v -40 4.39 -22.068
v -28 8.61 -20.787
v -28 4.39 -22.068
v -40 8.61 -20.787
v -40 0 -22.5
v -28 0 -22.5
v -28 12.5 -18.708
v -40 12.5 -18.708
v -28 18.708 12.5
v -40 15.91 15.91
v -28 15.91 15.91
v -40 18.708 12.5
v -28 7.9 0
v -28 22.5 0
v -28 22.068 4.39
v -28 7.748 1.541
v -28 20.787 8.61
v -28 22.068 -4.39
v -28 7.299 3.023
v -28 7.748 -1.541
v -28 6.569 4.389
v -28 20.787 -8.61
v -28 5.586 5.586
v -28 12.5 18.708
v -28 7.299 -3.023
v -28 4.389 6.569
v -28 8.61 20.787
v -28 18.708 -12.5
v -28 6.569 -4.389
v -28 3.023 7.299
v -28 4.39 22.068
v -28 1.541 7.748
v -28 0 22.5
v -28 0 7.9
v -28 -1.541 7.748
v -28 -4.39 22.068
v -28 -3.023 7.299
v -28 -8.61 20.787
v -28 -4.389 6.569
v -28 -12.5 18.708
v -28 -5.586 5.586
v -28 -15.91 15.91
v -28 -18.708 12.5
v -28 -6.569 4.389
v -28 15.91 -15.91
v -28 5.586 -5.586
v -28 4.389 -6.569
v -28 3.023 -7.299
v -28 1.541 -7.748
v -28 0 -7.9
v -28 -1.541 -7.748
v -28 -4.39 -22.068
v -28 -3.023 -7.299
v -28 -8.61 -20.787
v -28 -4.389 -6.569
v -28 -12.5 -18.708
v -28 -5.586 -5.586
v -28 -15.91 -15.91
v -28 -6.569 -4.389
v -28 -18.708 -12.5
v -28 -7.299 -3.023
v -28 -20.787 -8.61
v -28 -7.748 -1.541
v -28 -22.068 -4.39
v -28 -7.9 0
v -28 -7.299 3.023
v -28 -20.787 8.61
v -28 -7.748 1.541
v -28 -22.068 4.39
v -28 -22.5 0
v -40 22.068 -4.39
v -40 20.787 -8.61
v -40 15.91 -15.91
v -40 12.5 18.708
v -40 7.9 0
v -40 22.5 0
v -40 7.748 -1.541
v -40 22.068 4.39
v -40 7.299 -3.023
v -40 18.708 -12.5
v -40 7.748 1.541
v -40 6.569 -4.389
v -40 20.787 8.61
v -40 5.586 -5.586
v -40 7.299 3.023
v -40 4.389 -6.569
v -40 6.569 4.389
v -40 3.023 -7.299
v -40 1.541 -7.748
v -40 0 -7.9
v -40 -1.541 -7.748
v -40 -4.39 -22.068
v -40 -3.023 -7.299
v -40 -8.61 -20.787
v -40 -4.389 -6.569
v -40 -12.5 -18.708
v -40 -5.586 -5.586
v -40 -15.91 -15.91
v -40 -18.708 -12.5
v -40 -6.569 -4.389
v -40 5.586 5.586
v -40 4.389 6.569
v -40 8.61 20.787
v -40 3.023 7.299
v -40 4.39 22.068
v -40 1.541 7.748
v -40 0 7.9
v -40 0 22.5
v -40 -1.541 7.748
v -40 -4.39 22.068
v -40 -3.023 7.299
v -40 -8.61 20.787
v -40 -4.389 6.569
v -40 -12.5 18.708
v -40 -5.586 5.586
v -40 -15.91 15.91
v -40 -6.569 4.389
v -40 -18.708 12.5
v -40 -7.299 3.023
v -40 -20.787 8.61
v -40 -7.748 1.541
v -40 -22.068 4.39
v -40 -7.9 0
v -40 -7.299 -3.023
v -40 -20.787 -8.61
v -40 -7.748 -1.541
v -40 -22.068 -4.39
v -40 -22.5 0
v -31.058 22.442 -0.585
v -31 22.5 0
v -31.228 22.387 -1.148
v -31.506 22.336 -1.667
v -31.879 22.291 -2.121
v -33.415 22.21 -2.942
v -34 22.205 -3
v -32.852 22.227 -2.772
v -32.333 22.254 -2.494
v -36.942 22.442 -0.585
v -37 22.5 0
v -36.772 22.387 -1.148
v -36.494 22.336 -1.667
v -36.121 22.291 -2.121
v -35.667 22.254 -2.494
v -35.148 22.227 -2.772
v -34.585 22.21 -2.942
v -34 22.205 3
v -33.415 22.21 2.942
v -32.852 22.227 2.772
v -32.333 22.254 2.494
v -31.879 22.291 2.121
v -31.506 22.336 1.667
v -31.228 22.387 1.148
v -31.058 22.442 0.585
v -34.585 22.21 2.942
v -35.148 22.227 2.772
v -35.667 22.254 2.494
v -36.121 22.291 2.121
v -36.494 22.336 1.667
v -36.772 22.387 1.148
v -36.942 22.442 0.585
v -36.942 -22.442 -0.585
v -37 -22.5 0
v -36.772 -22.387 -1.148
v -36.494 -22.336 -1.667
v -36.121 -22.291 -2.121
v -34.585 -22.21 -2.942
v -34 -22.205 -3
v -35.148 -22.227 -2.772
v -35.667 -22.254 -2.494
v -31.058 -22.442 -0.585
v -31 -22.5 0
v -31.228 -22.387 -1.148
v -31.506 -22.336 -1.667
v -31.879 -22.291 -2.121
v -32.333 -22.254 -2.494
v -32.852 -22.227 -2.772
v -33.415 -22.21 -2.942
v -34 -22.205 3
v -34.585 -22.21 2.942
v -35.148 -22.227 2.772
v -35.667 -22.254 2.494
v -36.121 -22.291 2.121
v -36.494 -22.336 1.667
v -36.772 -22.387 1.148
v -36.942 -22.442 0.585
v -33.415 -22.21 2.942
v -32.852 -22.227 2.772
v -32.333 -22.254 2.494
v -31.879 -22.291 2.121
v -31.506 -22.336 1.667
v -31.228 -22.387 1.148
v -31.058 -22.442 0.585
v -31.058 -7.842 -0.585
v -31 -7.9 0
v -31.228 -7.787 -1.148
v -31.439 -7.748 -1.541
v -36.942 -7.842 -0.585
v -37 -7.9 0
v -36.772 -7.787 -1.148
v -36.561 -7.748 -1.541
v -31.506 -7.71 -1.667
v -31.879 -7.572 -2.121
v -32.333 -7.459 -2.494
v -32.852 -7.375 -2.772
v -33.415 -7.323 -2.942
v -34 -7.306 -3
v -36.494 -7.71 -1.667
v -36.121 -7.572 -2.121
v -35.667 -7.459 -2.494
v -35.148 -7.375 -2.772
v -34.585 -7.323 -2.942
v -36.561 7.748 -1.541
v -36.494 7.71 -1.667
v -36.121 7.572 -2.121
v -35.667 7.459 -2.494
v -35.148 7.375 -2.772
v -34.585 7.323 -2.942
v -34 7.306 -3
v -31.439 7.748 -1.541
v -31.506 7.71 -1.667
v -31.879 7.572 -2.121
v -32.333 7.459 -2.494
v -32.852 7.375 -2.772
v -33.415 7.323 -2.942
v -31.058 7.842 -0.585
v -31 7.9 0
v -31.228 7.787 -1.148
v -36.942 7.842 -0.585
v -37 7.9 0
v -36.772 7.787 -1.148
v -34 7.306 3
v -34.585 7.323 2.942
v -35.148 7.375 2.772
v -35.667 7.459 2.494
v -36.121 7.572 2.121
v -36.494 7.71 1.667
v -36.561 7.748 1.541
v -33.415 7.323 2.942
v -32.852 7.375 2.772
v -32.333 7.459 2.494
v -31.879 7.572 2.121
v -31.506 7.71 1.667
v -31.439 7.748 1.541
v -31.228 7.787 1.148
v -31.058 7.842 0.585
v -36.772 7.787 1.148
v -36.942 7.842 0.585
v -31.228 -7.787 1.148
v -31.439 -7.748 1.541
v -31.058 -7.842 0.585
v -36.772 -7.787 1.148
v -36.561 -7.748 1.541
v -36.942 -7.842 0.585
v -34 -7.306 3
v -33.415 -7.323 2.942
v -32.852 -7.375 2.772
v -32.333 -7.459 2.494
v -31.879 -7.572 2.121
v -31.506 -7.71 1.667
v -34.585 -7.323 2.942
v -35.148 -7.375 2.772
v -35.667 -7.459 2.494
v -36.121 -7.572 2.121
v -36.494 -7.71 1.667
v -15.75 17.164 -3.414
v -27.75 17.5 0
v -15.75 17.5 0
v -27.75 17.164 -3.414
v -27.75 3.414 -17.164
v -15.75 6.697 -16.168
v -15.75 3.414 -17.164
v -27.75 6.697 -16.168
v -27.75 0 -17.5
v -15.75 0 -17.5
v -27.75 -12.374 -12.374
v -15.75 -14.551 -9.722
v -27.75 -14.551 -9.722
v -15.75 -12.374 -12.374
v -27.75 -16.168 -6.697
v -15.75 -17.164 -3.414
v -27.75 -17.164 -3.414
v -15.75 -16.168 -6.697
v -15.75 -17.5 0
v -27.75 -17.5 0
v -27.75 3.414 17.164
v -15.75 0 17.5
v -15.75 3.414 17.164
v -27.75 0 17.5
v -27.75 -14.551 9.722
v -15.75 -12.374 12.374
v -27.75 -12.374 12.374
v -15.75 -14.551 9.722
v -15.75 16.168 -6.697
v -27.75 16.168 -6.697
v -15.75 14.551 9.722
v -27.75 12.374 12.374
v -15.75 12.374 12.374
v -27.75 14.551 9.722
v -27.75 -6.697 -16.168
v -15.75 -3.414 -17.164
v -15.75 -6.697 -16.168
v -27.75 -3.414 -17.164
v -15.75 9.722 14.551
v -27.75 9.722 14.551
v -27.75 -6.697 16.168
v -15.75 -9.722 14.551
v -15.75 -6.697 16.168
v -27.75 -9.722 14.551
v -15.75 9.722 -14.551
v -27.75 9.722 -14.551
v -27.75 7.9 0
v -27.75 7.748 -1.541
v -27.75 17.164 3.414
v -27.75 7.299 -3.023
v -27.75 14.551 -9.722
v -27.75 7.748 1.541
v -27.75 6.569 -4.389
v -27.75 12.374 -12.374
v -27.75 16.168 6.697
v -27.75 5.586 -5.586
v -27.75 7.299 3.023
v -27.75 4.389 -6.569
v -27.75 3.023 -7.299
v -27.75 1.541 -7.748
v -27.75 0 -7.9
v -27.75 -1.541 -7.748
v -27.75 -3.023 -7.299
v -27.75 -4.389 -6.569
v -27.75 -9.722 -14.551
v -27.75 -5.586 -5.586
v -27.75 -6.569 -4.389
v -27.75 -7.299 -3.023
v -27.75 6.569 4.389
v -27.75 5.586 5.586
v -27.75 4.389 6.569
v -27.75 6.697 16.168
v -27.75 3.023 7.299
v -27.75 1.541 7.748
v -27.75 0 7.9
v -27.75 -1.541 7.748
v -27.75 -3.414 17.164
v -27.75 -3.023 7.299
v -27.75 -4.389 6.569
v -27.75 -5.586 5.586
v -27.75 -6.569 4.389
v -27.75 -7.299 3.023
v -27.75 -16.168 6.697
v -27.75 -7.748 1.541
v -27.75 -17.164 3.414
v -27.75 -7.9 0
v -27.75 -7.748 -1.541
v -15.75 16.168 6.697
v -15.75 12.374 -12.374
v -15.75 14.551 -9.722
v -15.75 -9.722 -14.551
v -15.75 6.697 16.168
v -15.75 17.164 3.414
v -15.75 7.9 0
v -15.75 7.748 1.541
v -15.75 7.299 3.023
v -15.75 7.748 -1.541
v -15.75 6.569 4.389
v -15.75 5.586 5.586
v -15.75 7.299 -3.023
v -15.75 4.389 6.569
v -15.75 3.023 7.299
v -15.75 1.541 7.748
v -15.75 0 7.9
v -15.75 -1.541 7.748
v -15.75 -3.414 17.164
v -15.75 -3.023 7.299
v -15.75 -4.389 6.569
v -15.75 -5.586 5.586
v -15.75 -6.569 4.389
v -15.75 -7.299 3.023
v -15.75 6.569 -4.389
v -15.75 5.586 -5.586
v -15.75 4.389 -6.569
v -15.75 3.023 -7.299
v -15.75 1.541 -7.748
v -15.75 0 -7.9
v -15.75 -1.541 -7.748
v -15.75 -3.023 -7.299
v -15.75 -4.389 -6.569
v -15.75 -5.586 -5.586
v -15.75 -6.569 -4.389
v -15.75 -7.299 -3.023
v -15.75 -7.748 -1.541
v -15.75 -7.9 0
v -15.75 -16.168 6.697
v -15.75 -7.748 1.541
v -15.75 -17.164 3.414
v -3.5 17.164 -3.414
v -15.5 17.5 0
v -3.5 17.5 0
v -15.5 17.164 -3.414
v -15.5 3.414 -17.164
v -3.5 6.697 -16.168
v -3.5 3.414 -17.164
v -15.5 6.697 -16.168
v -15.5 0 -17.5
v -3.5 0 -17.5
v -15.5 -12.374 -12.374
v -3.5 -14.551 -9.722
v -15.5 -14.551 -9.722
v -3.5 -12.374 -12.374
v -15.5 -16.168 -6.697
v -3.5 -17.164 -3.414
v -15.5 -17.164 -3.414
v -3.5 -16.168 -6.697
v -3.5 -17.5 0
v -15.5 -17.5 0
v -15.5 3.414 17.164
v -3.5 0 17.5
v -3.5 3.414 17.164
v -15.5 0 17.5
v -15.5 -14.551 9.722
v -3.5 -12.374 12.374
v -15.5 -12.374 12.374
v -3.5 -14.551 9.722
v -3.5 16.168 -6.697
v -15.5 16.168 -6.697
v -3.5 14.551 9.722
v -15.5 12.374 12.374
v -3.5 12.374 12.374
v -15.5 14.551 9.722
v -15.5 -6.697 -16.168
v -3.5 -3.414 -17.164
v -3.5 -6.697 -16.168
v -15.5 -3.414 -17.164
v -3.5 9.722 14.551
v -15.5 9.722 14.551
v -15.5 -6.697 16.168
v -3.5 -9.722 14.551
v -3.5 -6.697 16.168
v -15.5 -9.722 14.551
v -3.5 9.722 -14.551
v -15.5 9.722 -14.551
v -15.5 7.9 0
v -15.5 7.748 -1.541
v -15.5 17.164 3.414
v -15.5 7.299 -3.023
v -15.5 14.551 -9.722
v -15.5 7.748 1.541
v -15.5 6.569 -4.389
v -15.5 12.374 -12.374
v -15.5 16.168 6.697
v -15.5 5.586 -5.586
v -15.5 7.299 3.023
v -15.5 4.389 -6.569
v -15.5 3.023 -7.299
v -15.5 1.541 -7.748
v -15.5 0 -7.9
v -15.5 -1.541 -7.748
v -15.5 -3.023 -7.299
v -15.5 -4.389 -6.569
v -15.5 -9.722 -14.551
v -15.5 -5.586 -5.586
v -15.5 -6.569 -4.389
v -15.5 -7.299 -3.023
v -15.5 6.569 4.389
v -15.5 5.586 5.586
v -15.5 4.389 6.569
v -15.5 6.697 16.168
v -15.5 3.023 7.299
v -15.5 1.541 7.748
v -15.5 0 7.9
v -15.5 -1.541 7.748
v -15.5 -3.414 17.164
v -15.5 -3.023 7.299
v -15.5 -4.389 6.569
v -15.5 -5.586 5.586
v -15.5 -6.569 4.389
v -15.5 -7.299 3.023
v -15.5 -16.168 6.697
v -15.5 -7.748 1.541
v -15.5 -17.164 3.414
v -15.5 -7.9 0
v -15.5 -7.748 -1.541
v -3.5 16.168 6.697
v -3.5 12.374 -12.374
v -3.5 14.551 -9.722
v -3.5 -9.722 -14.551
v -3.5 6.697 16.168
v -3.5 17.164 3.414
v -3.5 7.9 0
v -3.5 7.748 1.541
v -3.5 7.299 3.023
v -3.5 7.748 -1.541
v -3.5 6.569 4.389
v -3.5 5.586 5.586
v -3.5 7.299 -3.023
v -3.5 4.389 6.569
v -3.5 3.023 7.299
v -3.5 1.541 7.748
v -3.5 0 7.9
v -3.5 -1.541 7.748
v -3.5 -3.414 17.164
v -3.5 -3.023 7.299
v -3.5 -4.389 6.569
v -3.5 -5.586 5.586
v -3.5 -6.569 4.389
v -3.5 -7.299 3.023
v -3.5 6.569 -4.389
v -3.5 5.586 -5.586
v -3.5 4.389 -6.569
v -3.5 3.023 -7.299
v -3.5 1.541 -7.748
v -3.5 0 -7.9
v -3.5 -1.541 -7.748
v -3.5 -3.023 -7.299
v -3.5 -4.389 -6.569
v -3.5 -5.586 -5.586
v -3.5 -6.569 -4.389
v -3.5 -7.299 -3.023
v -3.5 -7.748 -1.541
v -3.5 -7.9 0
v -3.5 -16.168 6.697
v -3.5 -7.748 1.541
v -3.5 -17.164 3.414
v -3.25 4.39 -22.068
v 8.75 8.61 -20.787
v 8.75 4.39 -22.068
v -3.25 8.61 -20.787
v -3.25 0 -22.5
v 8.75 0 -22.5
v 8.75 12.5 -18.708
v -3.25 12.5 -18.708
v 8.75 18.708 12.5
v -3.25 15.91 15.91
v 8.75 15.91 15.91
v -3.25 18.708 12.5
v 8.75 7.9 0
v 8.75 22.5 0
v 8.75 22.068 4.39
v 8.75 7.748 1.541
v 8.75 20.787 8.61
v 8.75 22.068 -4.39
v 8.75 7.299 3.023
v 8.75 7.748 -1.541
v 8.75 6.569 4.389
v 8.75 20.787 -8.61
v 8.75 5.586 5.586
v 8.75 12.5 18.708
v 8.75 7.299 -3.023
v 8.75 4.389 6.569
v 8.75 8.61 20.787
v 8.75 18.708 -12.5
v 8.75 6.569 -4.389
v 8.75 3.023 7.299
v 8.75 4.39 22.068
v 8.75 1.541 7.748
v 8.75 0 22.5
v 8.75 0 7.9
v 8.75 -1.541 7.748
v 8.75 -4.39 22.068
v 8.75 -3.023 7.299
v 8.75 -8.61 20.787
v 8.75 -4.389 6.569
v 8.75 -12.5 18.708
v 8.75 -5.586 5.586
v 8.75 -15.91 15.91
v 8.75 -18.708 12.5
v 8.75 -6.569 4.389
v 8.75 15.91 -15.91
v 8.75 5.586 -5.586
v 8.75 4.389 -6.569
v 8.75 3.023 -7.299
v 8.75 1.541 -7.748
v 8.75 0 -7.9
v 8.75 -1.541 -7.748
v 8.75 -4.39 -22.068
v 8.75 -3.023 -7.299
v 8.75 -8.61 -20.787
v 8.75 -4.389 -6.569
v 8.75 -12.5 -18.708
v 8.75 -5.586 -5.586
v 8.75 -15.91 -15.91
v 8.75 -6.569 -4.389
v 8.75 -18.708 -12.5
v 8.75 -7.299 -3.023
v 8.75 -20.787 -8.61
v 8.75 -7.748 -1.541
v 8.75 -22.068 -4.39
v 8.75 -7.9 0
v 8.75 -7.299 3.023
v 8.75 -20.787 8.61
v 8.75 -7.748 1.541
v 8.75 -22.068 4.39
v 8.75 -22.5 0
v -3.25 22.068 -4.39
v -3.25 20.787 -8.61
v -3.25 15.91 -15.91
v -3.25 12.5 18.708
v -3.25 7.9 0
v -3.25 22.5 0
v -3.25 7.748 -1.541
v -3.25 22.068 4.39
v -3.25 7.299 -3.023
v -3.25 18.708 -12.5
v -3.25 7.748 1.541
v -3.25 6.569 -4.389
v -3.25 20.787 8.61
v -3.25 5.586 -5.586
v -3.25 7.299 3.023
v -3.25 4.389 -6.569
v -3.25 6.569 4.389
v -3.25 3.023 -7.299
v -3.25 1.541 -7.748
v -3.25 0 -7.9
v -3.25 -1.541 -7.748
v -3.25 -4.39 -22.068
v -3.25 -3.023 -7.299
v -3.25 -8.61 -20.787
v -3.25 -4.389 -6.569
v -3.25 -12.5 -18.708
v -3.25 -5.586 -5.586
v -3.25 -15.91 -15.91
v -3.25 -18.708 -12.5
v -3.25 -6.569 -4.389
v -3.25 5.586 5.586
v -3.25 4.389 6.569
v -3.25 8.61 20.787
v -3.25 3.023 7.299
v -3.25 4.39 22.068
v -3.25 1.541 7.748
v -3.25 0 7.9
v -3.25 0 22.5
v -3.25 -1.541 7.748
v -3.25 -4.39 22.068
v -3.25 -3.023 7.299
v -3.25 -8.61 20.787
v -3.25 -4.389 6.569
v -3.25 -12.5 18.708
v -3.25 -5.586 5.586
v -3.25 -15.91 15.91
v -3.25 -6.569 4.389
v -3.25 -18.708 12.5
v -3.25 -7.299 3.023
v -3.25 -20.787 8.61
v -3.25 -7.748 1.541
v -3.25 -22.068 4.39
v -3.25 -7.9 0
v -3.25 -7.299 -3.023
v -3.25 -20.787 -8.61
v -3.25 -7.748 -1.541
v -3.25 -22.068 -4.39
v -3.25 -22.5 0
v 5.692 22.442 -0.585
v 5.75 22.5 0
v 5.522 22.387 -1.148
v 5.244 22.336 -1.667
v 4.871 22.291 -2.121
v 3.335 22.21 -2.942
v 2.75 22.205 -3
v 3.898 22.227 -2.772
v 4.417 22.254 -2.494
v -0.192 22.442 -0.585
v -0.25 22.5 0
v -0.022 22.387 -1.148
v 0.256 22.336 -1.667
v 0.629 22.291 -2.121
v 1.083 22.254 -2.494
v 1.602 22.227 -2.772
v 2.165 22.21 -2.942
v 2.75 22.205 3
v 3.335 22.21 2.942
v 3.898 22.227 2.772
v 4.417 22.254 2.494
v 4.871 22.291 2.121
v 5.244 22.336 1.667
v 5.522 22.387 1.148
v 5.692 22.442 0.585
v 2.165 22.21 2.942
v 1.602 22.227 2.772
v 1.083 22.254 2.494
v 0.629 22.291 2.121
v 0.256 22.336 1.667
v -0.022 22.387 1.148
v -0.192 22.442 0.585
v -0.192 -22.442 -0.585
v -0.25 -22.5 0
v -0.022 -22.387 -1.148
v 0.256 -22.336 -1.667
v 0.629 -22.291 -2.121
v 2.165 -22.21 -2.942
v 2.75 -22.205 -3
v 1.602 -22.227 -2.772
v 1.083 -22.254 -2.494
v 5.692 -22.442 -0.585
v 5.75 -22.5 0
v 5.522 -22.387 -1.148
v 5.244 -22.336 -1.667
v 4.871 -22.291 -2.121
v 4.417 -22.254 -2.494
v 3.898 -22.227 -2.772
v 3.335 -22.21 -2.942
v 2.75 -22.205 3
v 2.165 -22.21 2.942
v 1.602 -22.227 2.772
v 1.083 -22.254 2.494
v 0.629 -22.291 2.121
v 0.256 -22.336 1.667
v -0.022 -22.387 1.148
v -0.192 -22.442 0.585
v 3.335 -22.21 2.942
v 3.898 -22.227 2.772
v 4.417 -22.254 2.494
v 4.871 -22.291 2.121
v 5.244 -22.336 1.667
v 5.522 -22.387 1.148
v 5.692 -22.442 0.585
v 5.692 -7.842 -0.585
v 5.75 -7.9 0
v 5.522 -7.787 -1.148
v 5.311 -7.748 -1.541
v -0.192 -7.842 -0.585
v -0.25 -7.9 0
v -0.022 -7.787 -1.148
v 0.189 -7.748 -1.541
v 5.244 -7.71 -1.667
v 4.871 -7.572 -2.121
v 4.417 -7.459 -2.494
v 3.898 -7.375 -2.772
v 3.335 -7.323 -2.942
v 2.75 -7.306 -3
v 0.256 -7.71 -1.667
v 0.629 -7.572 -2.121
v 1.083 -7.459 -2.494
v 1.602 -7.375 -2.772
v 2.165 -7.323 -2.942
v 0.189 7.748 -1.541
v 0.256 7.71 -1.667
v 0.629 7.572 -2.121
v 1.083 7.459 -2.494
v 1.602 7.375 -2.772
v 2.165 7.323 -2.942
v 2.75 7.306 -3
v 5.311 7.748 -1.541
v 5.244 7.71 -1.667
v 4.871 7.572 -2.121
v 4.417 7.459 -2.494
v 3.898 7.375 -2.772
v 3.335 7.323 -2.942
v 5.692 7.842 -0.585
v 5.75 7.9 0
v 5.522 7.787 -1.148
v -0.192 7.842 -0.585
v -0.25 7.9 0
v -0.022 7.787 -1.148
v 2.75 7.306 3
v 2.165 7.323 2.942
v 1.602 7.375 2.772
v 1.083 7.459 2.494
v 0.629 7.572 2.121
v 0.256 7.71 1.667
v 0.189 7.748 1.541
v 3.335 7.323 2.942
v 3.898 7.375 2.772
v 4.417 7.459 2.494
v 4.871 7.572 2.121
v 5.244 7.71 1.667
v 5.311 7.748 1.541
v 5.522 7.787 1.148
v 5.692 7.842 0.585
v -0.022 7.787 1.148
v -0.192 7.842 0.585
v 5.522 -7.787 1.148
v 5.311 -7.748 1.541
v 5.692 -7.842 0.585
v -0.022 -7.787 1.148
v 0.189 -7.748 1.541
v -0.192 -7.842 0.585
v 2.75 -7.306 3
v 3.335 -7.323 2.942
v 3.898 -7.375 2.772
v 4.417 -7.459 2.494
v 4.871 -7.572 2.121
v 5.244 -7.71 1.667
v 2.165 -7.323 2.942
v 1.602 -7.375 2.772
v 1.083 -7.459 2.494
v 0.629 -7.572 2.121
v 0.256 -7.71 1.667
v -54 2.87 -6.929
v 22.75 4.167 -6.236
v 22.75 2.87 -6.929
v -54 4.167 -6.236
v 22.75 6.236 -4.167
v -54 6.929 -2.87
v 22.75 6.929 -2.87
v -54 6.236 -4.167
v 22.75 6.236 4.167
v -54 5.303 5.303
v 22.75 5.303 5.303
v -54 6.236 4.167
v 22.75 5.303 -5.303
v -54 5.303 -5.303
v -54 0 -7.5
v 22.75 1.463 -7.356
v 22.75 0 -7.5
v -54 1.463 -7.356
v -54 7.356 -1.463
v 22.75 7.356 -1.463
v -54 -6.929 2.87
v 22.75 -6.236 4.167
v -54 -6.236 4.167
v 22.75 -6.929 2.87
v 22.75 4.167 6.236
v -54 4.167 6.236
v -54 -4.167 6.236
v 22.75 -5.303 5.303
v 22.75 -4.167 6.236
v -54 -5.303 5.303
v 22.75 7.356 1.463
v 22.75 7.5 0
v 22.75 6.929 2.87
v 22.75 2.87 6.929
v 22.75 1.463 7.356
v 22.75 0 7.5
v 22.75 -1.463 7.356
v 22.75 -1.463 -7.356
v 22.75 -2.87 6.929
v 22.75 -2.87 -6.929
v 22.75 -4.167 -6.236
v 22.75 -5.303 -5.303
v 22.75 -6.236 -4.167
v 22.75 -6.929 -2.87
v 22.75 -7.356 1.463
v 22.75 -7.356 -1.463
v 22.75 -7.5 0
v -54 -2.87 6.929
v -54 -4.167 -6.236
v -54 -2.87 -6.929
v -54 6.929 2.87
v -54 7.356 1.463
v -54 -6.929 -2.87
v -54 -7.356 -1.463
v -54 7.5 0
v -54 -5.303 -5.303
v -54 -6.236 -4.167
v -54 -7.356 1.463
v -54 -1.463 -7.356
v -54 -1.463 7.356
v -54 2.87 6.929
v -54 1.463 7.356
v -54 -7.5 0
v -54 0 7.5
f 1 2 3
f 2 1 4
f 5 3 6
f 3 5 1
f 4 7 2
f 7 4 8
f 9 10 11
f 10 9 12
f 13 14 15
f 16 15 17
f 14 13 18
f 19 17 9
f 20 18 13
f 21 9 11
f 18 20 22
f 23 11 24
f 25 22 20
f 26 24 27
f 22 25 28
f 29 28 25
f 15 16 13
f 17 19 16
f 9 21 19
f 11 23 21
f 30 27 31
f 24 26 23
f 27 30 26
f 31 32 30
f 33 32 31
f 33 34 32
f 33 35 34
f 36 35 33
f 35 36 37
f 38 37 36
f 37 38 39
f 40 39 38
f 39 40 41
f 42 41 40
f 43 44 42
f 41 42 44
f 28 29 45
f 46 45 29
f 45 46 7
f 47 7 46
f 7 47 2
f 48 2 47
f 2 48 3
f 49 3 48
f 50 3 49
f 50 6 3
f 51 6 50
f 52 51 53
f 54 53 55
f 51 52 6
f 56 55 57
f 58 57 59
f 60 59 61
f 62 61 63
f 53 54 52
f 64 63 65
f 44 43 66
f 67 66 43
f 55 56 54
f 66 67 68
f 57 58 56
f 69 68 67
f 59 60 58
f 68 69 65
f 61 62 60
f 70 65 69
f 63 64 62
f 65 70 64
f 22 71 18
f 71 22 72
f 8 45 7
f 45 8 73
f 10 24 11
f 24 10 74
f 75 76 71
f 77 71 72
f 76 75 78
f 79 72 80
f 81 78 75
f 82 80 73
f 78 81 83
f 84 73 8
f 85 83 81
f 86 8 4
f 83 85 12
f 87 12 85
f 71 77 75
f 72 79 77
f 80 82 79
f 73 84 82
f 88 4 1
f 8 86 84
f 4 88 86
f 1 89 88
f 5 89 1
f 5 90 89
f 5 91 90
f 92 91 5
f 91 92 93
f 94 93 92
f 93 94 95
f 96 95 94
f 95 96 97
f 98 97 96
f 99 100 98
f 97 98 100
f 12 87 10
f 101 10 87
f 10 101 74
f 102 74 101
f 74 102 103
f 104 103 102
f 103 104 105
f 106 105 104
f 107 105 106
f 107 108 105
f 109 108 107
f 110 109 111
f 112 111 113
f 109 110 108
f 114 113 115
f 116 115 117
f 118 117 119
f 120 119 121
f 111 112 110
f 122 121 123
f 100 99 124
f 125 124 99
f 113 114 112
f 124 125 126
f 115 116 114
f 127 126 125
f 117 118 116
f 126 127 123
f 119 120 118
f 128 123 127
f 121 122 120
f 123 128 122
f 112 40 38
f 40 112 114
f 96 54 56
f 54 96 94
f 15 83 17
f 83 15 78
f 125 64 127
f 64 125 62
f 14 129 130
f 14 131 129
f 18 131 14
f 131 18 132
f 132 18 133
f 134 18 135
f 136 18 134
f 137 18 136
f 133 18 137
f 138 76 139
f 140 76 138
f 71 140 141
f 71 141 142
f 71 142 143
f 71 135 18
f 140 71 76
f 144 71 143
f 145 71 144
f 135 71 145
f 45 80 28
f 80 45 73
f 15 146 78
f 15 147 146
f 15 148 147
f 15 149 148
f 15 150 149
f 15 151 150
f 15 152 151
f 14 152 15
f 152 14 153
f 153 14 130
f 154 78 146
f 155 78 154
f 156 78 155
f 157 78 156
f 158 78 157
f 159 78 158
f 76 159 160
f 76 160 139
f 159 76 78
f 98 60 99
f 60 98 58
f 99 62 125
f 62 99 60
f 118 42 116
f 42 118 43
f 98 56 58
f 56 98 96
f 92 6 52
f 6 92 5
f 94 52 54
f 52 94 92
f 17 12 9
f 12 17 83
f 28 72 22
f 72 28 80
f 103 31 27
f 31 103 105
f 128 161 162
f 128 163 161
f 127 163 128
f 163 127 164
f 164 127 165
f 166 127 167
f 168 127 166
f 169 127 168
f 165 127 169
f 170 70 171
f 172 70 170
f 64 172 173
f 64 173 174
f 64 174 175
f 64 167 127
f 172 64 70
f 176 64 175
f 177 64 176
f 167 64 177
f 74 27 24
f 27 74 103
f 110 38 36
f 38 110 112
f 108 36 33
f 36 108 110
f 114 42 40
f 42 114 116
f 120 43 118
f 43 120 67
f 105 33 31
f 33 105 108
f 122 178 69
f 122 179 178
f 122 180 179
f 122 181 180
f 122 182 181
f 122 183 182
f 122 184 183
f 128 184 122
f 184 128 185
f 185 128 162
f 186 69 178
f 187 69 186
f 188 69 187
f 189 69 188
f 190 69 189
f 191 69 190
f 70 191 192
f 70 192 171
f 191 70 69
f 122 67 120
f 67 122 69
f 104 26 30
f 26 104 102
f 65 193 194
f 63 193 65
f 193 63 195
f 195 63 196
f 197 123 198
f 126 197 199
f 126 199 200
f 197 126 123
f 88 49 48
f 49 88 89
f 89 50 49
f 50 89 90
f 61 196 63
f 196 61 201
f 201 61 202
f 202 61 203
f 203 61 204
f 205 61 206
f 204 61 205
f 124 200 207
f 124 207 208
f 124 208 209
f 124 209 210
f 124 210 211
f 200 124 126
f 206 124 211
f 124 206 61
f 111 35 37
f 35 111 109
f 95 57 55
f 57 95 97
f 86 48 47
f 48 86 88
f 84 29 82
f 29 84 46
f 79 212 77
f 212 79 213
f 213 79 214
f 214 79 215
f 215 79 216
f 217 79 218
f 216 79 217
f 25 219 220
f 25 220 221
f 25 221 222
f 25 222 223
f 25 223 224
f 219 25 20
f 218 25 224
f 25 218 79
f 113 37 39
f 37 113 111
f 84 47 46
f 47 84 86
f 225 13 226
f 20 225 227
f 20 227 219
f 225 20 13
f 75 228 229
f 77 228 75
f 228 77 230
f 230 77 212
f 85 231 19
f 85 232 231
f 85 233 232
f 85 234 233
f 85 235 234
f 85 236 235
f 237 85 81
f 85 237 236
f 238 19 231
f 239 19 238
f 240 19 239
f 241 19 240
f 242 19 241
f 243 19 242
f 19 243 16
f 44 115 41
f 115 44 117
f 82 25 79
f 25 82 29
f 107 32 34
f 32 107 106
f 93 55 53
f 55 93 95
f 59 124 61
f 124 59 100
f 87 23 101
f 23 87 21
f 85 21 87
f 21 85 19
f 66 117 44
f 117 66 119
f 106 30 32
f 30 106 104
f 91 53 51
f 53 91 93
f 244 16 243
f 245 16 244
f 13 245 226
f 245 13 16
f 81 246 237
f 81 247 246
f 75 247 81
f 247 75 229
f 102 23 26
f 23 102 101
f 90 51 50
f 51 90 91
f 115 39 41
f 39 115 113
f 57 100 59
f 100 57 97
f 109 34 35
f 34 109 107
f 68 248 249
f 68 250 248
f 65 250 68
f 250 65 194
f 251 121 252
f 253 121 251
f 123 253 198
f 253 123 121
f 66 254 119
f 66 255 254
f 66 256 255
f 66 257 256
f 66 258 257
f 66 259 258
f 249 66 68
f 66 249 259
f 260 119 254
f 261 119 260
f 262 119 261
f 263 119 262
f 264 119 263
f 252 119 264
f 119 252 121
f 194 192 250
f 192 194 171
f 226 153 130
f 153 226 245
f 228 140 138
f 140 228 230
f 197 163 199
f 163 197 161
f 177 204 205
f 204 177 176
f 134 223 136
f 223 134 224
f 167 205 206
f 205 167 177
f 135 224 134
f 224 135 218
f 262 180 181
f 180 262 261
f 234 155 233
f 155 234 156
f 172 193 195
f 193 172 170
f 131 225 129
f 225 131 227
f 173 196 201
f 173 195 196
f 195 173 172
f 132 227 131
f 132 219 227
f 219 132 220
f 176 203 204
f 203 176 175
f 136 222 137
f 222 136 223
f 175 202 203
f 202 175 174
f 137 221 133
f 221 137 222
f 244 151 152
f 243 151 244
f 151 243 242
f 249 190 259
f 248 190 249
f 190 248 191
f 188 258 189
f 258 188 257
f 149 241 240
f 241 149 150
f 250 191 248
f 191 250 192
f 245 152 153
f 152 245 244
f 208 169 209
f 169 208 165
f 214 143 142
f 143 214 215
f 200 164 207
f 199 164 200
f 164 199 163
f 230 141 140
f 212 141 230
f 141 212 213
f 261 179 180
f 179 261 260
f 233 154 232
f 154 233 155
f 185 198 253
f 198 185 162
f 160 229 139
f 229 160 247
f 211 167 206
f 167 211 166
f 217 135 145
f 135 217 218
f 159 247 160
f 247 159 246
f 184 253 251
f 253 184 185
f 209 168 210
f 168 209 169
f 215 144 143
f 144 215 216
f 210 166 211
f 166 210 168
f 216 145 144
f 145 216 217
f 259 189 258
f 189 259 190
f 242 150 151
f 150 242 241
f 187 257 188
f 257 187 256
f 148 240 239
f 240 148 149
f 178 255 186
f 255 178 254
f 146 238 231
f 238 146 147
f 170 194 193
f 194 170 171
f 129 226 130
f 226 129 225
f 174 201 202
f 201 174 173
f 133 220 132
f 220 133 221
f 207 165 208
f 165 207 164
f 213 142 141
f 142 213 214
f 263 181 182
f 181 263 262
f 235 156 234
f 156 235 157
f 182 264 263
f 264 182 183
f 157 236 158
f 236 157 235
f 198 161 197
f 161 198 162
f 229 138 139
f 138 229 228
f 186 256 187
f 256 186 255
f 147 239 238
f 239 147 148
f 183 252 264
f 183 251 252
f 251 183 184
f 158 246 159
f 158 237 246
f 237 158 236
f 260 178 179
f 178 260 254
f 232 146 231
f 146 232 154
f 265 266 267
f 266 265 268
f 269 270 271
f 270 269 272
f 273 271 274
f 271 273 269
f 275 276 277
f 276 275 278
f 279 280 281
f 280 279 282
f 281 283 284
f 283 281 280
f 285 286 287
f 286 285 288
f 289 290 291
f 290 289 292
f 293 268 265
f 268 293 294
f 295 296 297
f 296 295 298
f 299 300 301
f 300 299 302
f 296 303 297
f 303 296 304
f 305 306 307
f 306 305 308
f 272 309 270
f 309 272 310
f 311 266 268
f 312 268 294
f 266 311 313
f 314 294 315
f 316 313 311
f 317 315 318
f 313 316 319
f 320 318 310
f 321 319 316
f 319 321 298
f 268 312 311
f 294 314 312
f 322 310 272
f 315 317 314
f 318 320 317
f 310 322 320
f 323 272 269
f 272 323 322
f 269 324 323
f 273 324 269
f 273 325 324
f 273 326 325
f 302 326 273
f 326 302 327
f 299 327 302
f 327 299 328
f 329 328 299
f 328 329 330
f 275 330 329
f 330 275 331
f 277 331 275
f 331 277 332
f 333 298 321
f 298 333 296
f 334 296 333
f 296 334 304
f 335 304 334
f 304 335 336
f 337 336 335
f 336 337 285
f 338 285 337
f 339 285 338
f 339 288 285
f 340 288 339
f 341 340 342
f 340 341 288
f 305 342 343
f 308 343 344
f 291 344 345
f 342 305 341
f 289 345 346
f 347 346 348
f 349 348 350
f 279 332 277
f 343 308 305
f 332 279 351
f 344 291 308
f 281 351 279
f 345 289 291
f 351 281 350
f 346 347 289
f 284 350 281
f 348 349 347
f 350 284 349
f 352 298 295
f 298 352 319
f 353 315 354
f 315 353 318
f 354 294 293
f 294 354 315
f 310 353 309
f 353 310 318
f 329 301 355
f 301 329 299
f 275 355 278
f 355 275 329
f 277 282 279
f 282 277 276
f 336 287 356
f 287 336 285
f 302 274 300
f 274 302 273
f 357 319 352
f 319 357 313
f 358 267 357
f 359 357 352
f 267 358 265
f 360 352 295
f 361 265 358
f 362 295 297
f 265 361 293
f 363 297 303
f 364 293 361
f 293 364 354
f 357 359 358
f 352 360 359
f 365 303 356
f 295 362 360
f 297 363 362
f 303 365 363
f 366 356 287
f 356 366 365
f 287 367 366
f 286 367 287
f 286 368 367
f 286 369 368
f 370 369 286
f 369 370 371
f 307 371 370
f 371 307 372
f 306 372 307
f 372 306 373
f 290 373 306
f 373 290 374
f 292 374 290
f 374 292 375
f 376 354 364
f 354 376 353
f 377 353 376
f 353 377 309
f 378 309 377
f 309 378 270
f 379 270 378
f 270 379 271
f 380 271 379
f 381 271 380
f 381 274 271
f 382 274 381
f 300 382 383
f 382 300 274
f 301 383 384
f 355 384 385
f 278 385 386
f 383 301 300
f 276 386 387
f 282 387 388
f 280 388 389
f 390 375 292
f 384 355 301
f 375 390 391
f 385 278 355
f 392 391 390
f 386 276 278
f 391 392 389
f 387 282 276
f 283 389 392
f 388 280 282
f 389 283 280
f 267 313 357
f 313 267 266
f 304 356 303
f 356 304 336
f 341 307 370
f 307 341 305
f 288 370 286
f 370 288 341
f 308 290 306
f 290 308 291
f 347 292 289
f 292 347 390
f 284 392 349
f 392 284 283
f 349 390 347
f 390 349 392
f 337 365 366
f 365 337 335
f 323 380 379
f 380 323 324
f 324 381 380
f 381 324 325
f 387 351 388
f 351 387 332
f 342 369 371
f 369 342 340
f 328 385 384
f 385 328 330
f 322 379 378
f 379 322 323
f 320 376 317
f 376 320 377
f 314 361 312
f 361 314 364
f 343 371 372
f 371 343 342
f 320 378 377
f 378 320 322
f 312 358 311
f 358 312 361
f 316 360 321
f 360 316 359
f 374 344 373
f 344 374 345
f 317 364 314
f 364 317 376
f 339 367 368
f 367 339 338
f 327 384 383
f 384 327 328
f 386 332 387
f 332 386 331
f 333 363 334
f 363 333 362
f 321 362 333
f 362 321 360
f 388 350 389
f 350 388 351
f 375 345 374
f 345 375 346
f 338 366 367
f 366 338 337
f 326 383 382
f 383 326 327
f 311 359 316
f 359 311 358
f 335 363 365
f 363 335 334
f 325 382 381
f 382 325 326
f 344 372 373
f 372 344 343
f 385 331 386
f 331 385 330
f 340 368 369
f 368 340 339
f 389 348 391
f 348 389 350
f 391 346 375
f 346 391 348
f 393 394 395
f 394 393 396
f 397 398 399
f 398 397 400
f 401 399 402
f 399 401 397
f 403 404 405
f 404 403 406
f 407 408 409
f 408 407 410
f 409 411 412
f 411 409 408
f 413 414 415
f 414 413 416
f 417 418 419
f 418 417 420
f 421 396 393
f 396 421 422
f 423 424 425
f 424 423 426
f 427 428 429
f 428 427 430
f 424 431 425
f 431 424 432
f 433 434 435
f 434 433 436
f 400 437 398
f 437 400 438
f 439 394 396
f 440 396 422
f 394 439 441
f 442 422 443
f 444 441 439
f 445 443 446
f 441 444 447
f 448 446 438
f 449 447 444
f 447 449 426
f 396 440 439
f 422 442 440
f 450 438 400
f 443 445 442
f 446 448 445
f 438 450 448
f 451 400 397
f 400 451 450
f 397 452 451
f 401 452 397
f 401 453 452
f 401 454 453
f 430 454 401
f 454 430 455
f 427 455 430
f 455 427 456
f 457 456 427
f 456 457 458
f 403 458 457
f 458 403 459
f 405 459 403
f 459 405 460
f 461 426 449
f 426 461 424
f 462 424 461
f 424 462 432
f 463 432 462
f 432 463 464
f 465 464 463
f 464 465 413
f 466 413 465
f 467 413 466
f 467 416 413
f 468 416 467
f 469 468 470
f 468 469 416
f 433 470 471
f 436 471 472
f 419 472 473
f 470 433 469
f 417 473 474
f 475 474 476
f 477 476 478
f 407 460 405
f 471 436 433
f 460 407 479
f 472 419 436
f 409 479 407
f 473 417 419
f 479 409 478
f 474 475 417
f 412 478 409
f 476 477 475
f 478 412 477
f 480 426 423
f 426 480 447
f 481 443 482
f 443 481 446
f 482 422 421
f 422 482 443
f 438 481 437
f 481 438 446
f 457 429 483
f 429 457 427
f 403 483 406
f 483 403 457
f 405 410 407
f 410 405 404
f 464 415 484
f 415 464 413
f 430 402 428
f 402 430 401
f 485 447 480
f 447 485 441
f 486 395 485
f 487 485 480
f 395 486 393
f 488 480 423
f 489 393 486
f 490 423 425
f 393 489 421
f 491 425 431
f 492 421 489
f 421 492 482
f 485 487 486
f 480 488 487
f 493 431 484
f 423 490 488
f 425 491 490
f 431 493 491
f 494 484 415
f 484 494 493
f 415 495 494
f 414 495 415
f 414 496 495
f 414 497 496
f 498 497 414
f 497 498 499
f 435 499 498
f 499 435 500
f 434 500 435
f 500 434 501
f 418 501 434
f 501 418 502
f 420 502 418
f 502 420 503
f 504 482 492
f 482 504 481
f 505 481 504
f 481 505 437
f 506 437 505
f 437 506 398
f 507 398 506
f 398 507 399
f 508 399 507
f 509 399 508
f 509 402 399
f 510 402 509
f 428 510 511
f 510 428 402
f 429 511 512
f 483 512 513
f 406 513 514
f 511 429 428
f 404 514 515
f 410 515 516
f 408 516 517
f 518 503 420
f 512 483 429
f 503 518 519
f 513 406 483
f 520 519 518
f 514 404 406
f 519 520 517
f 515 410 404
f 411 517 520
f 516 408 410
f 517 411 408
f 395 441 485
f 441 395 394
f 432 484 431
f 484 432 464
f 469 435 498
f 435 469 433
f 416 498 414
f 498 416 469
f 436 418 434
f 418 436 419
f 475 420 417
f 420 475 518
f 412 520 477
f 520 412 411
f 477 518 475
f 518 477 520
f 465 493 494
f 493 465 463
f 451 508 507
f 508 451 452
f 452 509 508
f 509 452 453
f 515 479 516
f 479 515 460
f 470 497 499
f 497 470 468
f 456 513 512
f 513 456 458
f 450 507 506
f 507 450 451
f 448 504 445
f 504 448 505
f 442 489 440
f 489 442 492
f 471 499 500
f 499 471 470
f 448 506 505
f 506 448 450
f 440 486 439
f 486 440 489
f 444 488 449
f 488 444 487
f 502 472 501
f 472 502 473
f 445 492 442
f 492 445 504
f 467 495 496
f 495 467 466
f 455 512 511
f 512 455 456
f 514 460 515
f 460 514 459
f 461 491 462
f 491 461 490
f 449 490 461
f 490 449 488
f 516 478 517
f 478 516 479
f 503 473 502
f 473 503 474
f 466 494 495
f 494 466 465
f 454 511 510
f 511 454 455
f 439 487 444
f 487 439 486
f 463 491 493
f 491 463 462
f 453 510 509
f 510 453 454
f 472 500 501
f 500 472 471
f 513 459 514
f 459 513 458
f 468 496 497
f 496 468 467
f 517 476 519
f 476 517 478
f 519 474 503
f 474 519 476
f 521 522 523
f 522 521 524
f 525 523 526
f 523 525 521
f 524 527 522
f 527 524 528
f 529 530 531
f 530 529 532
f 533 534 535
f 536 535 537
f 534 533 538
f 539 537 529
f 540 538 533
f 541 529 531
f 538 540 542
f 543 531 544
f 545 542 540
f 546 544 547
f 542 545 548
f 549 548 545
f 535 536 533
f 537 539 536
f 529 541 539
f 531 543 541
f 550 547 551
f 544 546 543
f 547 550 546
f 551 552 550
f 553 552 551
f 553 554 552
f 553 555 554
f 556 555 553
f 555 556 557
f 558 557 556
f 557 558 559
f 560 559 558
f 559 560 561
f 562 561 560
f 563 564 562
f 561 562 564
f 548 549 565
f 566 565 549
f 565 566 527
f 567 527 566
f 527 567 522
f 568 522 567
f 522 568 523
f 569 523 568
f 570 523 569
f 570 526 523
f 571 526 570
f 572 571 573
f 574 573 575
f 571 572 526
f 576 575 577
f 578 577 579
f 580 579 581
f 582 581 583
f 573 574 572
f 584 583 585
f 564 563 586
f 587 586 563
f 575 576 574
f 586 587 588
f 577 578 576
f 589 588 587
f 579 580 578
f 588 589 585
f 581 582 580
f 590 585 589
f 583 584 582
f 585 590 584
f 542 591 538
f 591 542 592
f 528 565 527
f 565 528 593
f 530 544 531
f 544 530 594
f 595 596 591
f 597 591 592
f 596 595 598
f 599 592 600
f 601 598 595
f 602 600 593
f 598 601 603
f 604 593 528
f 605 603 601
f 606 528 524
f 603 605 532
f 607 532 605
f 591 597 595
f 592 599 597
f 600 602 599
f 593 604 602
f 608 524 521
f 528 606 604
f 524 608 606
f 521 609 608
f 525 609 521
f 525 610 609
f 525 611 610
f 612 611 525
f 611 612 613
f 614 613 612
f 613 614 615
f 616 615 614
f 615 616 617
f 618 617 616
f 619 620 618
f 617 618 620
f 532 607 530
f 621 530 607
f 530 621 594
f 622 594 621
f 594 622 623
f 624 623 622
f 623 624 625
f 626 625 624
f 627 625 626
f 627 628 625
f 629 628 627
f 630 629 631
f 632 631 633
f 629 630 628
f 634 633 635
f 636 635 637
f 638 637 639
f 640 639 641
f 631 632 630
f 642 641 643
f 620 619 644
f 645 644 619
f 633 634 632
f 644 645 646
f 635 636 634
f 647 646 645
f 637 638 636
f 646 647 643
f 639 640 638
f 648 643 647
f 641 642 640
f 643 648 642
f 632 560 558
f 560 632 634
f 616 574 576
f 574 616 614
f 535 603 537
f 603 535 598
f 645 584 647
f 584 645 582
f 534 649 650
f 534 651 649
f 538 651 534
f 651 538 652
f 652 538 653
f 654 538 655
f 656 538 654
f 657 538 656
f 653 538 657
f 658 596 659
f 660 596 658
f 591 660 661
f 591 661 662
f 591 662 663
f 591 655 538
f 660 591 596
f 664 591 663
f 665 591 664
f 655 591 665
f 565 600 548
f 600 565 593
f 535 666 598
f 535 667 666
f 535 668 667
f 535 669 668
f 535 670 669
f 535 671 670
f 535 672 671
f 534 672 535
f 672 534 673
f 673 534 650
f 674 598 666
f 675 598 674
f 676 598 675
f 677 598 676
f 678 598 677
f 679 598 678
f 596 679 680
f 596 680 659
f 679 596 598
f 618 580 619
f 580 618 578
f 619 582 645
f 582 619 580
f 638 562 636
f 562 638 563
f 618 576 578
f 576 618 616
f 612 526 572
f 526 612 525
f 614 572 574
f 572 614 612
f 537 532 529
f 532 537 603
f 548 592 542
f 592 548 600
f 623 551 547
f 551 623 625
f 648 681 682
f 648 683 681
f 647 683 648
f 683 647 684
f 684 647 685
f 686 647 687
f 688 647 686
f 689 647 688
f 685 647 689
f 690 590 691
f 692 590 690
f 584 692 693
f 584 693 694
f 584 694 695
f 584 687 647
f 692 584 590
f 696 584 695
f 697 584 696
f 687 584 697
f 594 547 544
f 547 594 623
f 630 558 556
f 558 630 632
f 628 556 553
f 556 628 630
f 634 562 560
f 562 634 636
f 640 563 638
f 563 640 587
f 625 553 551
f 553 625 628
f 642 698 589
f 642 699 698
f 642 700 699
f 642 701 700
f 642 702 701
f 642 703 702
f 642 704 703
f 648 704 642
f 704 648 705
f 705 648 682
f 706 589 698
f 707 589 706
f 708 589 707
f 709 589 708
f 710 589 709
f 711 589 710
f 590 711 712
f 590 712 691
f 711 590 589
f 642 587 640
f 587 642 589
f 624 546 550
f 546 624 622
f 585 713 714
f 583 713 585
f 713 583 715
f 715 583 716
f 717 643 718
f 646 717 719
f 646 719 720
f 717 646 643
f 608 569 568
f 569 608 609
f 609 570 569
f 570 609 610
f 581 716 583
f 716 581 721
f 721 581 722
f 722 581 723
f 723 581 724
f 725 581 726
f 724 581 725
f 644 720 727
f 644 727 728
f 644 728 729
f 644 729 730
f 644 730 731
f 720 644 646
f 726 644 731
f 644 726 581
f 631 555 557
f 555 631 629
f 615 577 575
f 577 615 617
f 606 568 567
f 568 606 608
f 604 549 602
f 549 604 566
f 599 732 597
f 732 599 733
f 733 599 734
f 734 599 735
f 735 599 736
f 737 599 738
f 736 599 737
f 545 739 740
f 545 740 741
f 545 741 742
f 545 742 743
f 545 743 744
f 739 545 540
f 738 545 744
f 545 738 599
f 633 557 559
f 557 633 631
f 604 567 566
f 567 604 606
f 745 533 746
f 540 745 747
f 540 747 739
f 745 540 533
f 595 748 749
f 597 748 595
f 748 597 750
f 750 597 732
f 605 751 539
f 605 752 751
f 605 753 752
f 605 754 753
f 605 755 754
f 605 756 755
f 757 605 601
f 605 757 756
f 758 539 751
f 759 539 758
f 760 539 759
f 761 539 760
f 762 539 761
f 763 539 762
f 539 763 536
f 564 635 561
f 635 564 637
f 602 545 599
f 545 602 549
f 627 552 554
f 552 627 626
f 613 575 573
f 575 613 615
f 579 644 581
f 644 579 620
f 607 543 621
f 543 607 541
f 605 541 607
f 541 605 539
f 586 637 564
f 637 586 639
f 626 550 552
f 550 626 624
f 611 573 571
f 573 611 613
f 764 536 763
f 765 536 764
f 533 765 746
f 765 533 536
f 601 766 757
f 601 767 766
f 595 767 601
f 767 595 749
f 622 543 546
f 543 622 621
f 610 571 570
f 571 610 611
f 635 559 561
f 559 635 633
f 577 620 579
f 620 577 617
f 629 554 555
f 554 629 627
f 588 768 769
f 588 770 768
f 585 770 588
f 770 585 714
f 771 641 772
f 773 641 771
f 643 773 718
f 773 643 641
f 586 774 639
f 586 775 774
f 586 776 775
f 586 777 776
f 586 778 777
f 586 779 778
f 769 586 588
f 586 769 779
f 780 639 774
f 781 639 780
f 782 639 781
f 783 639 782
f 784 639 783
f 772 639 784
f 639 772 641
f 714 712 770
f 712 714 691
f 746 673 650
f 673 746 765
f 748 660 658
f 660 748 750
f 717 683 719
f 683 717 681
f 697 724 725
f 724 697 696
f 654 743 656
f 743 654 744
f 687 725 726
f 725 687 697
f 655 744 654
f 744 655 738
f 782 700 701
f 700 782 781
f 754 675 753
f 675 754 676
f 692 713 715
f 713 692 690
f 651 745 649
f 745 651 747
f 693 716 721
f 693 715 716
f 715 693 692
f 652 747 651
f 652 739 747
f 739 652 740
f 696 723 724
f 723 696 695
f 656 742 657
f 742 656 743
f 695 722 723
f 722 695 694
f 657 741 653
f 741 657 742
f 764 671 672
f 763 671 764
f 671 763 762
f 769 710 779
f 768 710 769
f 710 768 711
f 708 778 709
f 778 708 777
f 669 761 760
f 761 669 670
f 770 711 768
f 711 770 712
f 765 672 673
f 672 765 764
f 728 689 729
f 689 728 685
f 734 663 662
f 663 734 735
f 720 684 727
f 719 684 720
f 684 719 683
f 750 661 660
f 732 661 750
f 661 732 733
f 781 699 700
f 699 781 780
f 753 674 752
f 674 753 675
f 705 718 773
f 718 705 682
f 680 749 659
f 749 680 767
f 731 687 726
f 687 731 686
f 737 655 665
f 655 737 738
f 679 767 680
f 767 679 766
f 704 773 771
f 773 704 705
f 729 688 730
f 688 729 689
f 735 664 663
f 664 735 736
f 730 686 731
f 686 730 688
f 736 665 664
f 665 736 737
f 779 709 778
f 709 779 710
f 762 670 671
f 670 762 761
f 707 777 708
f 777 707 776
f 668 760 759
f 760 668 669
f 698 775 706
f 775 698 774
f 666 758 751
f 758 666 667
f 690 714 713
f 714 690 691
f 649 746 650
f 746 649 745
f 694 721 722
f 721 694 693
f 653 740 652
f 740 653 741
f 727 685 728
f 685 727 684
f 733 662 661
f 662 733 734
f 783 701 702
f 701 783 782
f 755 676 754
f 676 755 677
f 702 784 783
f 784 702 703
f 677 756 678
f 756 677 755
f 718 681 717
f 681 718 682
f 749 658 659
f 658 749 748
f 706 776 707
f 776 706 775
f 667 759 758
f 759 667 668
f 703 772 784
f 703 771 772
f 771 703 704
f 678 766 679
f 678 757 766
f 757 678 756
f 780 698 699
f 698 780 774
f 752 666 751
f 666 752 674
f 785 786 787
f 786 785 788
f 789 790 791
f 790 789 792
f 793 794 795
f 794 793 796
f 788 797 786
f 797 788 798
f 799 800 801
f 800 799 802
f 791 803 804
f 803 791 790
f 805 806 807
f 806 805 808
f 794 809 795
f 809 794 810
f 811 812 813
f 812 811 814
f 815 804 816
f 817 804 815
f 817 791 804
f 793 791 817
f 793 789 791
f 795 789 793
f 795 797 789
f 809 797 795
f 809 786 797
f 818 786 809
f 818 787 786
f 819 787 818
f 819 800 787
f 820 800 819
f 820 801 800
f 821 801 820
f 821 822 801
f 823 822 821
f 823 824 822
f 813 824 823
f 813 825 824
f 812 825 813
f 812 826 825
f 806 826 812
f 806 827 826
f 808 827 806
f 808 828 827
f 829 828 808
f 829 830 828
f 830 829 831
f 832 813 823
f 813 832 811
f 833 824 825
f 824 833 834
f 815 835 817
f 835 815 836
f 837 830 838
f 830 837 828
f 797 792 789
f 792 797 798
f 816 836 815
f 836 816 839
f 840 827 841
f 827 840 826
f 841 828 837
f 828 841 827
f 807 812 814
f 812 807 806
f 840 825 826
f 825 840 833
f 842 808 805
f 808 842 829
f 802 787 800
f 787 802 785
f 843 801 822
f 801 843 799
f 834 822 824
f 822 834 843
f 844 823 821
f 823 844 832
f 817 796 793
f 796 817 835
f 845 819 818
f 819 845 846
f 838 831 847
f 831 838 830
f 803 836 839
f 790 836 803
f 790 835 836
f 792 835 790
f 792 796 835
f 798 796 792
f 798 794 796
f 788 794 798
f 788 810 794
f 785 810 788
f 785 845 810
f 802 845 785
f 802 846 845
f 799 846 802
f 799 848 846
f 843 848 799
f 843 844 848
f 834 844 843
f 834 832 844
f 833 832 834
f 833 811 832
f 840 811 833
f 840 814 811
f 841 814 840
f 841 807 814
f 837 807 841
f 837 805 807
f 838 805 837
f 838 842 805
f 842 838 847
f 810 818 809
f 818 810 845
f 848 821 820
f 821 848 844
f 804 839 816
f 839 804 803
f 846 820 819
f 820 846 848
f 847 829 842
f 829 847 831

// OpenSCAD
$fn = 32;

// ------------------------------------------------------------------------
// Shaft with rings and collars: d15 shaft, 4 rings
// Every part is its own module, assembly() places them once.
// ------------------------------------------------------------------------

// --- part 1 ---
module shaft() {
  translate([0, 0, -38.375]) cylinder(h = 76.75, d = 15);
}

// --- part 2 ---
module collar_a() {
  difference() {
    cylinder(h = 12, d = 45);
    translate([0, 0, -1]) cylinder(h = 14, d = 15.8);
    translate([0, 0, 6]) rotate([90, 0, 0]) cylinder(h = 47, d = 6, center = true);
  }
}

// --- part 3 ---
module spacer_a() {
  difference() {
      translate([0, 0, 0]) cylinder(h = 12, d = 35);
      translate([0, 0, -1]) cylinder(h = 14, d = 15.8);
    }
}

// --- part 4 ---
module spacer_b() {
  difference() {
      translate([0, 0, 0]) cylinder(h = 12, d = 35);
      translate([0, 0, -1]) cylinder(h = 14, d = 15.8);
    }
}

// --- part 5 ---
module collar_b() {
  difference() {
    cylinder(h = 12, d = 45);
    translate([0, 0, -1]) cylinder(h = 14, d = 15.8);
    translate([0, 0, 6]) rotate([90, 0, 0]) cylinder(h = 47, d = 6, center = true);
  }
}

// --- assembly ---
module assembly() {
  translate([-15.625, 0, 0]) rotate([0, 90, 0]) shaft();
  translate([-40, 0, 0]) rotate([0, 90, 0]) collar_a();
  translate([-27.75, 0, 0]) rotate([0, 90, 0]) spacer_a();
  translate([-15.5, 0, 0]) rotate([0, 90, 0]) spacer_b();
  translate([-3.25, 0, 0]) rotate([0, 90, 0]) collar_b();
}

assembly();
